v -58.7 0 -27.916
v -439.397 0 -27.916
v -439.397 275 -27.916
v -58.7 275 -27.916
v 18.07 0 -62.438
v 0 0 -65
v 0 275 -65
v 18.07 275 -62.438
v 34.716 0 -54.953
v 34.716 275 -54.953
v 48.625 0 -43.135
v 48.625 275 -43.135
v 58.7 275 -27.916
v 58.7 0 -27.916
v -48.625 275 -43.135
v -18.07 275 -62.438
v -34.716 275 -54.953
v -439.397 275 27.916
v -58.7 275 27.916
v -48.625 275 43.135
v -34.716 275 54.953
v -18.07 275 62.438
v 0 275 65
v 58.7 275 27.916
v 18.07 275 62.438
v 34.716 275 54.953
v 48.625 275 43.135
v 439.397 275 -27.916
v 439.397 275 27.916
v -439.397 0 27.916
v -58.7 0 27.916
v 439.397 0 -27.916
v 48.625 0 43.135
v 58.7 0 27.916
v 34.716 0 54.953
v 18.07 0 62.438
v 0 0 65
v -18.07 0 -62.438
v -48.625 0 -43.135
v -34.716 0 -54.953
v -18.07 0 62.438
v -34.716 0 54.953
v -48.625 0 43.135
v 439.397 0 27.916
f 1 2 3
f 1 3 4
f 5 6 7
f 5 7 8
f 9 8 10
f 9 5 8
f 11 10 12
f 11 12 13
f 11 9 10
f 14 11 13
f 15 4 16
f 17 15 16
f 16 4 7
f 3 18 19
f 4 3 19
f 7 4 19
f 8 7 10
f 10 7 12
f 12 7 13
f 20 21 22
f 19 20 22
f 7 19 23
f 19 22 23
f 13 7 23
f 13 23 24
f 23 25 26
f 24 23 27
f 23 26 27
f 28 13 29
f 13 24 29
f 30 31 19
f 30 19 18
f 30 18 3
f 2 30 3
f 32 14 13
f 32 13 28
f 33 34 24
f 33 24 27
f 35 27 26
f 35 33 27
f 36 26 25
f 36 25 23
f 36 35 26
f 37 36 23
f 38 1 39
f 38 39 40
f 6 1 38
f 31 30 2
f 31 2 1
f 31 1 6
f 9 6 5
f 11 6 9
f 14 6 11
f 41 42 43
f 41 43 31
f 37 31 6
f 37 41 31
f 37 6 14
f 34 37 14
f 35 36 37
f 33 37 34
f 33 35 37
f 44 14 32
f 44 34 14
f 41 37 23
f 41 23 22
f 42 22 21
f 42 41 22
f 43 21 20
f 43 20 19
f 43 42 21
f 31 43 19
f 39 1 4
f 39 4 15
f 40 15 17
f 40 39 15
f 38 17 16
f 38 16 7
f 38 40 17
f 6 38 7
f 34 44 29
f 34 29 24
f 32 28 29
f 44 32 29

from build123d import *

# Parameters (mm, degrees)
F1_DEPTH = 275


with BuildPart() as f1:
    # F0 (on Front) → F1 (new body)
    with BuildSketch(Plane.XZ):
        with BuildLine():
            ThreePointArc((-58.699841, -27.916459), (-63.405401, -14.309269), (-65, 0))
            ThreePointArc((-65, 0), (-63.405401, 14.309269), (-58.699841, 27.916459))
            Line((-58.699841, 27.916459), (-439.396739, 27.916459))
            Line((-439.396739, 27.916459), (-439.396739, -27.916459))
            Line((-439.396739, -27.916459), (-58.699841, -27.916459))
        make_face()
        with BuildLine():
            ThreePointArc((58.699841, 27.916459), (63.405401, 14.309269), (65, 0))
            ThreePointArc((65, 0), (63.405401, -14.309269), (58.699841, -27.916459))
            Line((58.699841, -27.916459), (439.396739, -27.916459))
            Line((439.396739, -27.916459), (439.396739, 27.916459))
            Line((439.396739, 27.916459), (58.699841, 27.916459))
        make_face()
        with BuildLine():
            Line((-65, 0), (0, 0))
            Line((0, 0), (0, 27.916459))
            Line((0, 27.916459), (-58.699841, 27.916459))
            ThreePointArc((-58.699841, 27.916459), (-63.405401, 14.309269), (-65, 0))
        make_face()
        with BuildLine():
            Line((0, 0), (65, 0))
            ThreePointArc((65, 0), (63.405401, 14.309269), (58.699841, 27.916459))
            Line((58.699841, 27.916459), (0, 27.916459))
            Line((0, 27.916459), (0, 0))
        make_face()
        with BuildLine():
            Line((0, 27.916459), (58.699841, 27.916459))
            ThreePointArc((58.699841, 27.916459), (34.716208, 54.95257), (0, 65))
            Line((0, 65), (0, 27.916459))
        make_face()
        with BuildLine():
            ThreePointArc((0, -65), (34.716208, -54.95257), (58.699841, -27.916459))
            Line((58.699841, -27.916459), (0, -27.916459))
            Line((0, -27.916459), (0, -65))
        make_face()
        with BuildLine():
            Line((0, -27.916459), (0, 0))
            Line((0, 0), (-65, 0))
            ThreePointArc((-65, 0), (-63.405401, -14.309269), (-58.699841, -27.916459))
            Line((-58.699841, -27.916459), (0, -27.916459))
        make_face()
        with BuildLine():
            ThreePointArc((58.699841, -27.916459), (63.405401, -14.309269), (65, 0))
            Line((65, 0), (0, 0))
            Line((0, 0), (0, -27.916459))
            Line((0, -27.916459), (58.699841, -27.916459))
        make_face()
        with BuildLine():
            ThreePointArc((-58.699841, -27.916459), (-34.716208, -54.95257), (0, -65))
            Line((0, -65), (0, -27.916459))
            Line((0, -27.916459), (-58.699841, -27.916459))
        make_face()
        with BuildLine():
            Line((0, 27.916459), (0, 65))
            ThreePointArc((0, 65), (-34.716208, 54.95257), (-58.699841, 27.916459))
            Line((-58.699841, 27.916459), (0, 27.916459))
        make_face()
    extrude(amount=-F1_DEPTH)


solid = f1.part
